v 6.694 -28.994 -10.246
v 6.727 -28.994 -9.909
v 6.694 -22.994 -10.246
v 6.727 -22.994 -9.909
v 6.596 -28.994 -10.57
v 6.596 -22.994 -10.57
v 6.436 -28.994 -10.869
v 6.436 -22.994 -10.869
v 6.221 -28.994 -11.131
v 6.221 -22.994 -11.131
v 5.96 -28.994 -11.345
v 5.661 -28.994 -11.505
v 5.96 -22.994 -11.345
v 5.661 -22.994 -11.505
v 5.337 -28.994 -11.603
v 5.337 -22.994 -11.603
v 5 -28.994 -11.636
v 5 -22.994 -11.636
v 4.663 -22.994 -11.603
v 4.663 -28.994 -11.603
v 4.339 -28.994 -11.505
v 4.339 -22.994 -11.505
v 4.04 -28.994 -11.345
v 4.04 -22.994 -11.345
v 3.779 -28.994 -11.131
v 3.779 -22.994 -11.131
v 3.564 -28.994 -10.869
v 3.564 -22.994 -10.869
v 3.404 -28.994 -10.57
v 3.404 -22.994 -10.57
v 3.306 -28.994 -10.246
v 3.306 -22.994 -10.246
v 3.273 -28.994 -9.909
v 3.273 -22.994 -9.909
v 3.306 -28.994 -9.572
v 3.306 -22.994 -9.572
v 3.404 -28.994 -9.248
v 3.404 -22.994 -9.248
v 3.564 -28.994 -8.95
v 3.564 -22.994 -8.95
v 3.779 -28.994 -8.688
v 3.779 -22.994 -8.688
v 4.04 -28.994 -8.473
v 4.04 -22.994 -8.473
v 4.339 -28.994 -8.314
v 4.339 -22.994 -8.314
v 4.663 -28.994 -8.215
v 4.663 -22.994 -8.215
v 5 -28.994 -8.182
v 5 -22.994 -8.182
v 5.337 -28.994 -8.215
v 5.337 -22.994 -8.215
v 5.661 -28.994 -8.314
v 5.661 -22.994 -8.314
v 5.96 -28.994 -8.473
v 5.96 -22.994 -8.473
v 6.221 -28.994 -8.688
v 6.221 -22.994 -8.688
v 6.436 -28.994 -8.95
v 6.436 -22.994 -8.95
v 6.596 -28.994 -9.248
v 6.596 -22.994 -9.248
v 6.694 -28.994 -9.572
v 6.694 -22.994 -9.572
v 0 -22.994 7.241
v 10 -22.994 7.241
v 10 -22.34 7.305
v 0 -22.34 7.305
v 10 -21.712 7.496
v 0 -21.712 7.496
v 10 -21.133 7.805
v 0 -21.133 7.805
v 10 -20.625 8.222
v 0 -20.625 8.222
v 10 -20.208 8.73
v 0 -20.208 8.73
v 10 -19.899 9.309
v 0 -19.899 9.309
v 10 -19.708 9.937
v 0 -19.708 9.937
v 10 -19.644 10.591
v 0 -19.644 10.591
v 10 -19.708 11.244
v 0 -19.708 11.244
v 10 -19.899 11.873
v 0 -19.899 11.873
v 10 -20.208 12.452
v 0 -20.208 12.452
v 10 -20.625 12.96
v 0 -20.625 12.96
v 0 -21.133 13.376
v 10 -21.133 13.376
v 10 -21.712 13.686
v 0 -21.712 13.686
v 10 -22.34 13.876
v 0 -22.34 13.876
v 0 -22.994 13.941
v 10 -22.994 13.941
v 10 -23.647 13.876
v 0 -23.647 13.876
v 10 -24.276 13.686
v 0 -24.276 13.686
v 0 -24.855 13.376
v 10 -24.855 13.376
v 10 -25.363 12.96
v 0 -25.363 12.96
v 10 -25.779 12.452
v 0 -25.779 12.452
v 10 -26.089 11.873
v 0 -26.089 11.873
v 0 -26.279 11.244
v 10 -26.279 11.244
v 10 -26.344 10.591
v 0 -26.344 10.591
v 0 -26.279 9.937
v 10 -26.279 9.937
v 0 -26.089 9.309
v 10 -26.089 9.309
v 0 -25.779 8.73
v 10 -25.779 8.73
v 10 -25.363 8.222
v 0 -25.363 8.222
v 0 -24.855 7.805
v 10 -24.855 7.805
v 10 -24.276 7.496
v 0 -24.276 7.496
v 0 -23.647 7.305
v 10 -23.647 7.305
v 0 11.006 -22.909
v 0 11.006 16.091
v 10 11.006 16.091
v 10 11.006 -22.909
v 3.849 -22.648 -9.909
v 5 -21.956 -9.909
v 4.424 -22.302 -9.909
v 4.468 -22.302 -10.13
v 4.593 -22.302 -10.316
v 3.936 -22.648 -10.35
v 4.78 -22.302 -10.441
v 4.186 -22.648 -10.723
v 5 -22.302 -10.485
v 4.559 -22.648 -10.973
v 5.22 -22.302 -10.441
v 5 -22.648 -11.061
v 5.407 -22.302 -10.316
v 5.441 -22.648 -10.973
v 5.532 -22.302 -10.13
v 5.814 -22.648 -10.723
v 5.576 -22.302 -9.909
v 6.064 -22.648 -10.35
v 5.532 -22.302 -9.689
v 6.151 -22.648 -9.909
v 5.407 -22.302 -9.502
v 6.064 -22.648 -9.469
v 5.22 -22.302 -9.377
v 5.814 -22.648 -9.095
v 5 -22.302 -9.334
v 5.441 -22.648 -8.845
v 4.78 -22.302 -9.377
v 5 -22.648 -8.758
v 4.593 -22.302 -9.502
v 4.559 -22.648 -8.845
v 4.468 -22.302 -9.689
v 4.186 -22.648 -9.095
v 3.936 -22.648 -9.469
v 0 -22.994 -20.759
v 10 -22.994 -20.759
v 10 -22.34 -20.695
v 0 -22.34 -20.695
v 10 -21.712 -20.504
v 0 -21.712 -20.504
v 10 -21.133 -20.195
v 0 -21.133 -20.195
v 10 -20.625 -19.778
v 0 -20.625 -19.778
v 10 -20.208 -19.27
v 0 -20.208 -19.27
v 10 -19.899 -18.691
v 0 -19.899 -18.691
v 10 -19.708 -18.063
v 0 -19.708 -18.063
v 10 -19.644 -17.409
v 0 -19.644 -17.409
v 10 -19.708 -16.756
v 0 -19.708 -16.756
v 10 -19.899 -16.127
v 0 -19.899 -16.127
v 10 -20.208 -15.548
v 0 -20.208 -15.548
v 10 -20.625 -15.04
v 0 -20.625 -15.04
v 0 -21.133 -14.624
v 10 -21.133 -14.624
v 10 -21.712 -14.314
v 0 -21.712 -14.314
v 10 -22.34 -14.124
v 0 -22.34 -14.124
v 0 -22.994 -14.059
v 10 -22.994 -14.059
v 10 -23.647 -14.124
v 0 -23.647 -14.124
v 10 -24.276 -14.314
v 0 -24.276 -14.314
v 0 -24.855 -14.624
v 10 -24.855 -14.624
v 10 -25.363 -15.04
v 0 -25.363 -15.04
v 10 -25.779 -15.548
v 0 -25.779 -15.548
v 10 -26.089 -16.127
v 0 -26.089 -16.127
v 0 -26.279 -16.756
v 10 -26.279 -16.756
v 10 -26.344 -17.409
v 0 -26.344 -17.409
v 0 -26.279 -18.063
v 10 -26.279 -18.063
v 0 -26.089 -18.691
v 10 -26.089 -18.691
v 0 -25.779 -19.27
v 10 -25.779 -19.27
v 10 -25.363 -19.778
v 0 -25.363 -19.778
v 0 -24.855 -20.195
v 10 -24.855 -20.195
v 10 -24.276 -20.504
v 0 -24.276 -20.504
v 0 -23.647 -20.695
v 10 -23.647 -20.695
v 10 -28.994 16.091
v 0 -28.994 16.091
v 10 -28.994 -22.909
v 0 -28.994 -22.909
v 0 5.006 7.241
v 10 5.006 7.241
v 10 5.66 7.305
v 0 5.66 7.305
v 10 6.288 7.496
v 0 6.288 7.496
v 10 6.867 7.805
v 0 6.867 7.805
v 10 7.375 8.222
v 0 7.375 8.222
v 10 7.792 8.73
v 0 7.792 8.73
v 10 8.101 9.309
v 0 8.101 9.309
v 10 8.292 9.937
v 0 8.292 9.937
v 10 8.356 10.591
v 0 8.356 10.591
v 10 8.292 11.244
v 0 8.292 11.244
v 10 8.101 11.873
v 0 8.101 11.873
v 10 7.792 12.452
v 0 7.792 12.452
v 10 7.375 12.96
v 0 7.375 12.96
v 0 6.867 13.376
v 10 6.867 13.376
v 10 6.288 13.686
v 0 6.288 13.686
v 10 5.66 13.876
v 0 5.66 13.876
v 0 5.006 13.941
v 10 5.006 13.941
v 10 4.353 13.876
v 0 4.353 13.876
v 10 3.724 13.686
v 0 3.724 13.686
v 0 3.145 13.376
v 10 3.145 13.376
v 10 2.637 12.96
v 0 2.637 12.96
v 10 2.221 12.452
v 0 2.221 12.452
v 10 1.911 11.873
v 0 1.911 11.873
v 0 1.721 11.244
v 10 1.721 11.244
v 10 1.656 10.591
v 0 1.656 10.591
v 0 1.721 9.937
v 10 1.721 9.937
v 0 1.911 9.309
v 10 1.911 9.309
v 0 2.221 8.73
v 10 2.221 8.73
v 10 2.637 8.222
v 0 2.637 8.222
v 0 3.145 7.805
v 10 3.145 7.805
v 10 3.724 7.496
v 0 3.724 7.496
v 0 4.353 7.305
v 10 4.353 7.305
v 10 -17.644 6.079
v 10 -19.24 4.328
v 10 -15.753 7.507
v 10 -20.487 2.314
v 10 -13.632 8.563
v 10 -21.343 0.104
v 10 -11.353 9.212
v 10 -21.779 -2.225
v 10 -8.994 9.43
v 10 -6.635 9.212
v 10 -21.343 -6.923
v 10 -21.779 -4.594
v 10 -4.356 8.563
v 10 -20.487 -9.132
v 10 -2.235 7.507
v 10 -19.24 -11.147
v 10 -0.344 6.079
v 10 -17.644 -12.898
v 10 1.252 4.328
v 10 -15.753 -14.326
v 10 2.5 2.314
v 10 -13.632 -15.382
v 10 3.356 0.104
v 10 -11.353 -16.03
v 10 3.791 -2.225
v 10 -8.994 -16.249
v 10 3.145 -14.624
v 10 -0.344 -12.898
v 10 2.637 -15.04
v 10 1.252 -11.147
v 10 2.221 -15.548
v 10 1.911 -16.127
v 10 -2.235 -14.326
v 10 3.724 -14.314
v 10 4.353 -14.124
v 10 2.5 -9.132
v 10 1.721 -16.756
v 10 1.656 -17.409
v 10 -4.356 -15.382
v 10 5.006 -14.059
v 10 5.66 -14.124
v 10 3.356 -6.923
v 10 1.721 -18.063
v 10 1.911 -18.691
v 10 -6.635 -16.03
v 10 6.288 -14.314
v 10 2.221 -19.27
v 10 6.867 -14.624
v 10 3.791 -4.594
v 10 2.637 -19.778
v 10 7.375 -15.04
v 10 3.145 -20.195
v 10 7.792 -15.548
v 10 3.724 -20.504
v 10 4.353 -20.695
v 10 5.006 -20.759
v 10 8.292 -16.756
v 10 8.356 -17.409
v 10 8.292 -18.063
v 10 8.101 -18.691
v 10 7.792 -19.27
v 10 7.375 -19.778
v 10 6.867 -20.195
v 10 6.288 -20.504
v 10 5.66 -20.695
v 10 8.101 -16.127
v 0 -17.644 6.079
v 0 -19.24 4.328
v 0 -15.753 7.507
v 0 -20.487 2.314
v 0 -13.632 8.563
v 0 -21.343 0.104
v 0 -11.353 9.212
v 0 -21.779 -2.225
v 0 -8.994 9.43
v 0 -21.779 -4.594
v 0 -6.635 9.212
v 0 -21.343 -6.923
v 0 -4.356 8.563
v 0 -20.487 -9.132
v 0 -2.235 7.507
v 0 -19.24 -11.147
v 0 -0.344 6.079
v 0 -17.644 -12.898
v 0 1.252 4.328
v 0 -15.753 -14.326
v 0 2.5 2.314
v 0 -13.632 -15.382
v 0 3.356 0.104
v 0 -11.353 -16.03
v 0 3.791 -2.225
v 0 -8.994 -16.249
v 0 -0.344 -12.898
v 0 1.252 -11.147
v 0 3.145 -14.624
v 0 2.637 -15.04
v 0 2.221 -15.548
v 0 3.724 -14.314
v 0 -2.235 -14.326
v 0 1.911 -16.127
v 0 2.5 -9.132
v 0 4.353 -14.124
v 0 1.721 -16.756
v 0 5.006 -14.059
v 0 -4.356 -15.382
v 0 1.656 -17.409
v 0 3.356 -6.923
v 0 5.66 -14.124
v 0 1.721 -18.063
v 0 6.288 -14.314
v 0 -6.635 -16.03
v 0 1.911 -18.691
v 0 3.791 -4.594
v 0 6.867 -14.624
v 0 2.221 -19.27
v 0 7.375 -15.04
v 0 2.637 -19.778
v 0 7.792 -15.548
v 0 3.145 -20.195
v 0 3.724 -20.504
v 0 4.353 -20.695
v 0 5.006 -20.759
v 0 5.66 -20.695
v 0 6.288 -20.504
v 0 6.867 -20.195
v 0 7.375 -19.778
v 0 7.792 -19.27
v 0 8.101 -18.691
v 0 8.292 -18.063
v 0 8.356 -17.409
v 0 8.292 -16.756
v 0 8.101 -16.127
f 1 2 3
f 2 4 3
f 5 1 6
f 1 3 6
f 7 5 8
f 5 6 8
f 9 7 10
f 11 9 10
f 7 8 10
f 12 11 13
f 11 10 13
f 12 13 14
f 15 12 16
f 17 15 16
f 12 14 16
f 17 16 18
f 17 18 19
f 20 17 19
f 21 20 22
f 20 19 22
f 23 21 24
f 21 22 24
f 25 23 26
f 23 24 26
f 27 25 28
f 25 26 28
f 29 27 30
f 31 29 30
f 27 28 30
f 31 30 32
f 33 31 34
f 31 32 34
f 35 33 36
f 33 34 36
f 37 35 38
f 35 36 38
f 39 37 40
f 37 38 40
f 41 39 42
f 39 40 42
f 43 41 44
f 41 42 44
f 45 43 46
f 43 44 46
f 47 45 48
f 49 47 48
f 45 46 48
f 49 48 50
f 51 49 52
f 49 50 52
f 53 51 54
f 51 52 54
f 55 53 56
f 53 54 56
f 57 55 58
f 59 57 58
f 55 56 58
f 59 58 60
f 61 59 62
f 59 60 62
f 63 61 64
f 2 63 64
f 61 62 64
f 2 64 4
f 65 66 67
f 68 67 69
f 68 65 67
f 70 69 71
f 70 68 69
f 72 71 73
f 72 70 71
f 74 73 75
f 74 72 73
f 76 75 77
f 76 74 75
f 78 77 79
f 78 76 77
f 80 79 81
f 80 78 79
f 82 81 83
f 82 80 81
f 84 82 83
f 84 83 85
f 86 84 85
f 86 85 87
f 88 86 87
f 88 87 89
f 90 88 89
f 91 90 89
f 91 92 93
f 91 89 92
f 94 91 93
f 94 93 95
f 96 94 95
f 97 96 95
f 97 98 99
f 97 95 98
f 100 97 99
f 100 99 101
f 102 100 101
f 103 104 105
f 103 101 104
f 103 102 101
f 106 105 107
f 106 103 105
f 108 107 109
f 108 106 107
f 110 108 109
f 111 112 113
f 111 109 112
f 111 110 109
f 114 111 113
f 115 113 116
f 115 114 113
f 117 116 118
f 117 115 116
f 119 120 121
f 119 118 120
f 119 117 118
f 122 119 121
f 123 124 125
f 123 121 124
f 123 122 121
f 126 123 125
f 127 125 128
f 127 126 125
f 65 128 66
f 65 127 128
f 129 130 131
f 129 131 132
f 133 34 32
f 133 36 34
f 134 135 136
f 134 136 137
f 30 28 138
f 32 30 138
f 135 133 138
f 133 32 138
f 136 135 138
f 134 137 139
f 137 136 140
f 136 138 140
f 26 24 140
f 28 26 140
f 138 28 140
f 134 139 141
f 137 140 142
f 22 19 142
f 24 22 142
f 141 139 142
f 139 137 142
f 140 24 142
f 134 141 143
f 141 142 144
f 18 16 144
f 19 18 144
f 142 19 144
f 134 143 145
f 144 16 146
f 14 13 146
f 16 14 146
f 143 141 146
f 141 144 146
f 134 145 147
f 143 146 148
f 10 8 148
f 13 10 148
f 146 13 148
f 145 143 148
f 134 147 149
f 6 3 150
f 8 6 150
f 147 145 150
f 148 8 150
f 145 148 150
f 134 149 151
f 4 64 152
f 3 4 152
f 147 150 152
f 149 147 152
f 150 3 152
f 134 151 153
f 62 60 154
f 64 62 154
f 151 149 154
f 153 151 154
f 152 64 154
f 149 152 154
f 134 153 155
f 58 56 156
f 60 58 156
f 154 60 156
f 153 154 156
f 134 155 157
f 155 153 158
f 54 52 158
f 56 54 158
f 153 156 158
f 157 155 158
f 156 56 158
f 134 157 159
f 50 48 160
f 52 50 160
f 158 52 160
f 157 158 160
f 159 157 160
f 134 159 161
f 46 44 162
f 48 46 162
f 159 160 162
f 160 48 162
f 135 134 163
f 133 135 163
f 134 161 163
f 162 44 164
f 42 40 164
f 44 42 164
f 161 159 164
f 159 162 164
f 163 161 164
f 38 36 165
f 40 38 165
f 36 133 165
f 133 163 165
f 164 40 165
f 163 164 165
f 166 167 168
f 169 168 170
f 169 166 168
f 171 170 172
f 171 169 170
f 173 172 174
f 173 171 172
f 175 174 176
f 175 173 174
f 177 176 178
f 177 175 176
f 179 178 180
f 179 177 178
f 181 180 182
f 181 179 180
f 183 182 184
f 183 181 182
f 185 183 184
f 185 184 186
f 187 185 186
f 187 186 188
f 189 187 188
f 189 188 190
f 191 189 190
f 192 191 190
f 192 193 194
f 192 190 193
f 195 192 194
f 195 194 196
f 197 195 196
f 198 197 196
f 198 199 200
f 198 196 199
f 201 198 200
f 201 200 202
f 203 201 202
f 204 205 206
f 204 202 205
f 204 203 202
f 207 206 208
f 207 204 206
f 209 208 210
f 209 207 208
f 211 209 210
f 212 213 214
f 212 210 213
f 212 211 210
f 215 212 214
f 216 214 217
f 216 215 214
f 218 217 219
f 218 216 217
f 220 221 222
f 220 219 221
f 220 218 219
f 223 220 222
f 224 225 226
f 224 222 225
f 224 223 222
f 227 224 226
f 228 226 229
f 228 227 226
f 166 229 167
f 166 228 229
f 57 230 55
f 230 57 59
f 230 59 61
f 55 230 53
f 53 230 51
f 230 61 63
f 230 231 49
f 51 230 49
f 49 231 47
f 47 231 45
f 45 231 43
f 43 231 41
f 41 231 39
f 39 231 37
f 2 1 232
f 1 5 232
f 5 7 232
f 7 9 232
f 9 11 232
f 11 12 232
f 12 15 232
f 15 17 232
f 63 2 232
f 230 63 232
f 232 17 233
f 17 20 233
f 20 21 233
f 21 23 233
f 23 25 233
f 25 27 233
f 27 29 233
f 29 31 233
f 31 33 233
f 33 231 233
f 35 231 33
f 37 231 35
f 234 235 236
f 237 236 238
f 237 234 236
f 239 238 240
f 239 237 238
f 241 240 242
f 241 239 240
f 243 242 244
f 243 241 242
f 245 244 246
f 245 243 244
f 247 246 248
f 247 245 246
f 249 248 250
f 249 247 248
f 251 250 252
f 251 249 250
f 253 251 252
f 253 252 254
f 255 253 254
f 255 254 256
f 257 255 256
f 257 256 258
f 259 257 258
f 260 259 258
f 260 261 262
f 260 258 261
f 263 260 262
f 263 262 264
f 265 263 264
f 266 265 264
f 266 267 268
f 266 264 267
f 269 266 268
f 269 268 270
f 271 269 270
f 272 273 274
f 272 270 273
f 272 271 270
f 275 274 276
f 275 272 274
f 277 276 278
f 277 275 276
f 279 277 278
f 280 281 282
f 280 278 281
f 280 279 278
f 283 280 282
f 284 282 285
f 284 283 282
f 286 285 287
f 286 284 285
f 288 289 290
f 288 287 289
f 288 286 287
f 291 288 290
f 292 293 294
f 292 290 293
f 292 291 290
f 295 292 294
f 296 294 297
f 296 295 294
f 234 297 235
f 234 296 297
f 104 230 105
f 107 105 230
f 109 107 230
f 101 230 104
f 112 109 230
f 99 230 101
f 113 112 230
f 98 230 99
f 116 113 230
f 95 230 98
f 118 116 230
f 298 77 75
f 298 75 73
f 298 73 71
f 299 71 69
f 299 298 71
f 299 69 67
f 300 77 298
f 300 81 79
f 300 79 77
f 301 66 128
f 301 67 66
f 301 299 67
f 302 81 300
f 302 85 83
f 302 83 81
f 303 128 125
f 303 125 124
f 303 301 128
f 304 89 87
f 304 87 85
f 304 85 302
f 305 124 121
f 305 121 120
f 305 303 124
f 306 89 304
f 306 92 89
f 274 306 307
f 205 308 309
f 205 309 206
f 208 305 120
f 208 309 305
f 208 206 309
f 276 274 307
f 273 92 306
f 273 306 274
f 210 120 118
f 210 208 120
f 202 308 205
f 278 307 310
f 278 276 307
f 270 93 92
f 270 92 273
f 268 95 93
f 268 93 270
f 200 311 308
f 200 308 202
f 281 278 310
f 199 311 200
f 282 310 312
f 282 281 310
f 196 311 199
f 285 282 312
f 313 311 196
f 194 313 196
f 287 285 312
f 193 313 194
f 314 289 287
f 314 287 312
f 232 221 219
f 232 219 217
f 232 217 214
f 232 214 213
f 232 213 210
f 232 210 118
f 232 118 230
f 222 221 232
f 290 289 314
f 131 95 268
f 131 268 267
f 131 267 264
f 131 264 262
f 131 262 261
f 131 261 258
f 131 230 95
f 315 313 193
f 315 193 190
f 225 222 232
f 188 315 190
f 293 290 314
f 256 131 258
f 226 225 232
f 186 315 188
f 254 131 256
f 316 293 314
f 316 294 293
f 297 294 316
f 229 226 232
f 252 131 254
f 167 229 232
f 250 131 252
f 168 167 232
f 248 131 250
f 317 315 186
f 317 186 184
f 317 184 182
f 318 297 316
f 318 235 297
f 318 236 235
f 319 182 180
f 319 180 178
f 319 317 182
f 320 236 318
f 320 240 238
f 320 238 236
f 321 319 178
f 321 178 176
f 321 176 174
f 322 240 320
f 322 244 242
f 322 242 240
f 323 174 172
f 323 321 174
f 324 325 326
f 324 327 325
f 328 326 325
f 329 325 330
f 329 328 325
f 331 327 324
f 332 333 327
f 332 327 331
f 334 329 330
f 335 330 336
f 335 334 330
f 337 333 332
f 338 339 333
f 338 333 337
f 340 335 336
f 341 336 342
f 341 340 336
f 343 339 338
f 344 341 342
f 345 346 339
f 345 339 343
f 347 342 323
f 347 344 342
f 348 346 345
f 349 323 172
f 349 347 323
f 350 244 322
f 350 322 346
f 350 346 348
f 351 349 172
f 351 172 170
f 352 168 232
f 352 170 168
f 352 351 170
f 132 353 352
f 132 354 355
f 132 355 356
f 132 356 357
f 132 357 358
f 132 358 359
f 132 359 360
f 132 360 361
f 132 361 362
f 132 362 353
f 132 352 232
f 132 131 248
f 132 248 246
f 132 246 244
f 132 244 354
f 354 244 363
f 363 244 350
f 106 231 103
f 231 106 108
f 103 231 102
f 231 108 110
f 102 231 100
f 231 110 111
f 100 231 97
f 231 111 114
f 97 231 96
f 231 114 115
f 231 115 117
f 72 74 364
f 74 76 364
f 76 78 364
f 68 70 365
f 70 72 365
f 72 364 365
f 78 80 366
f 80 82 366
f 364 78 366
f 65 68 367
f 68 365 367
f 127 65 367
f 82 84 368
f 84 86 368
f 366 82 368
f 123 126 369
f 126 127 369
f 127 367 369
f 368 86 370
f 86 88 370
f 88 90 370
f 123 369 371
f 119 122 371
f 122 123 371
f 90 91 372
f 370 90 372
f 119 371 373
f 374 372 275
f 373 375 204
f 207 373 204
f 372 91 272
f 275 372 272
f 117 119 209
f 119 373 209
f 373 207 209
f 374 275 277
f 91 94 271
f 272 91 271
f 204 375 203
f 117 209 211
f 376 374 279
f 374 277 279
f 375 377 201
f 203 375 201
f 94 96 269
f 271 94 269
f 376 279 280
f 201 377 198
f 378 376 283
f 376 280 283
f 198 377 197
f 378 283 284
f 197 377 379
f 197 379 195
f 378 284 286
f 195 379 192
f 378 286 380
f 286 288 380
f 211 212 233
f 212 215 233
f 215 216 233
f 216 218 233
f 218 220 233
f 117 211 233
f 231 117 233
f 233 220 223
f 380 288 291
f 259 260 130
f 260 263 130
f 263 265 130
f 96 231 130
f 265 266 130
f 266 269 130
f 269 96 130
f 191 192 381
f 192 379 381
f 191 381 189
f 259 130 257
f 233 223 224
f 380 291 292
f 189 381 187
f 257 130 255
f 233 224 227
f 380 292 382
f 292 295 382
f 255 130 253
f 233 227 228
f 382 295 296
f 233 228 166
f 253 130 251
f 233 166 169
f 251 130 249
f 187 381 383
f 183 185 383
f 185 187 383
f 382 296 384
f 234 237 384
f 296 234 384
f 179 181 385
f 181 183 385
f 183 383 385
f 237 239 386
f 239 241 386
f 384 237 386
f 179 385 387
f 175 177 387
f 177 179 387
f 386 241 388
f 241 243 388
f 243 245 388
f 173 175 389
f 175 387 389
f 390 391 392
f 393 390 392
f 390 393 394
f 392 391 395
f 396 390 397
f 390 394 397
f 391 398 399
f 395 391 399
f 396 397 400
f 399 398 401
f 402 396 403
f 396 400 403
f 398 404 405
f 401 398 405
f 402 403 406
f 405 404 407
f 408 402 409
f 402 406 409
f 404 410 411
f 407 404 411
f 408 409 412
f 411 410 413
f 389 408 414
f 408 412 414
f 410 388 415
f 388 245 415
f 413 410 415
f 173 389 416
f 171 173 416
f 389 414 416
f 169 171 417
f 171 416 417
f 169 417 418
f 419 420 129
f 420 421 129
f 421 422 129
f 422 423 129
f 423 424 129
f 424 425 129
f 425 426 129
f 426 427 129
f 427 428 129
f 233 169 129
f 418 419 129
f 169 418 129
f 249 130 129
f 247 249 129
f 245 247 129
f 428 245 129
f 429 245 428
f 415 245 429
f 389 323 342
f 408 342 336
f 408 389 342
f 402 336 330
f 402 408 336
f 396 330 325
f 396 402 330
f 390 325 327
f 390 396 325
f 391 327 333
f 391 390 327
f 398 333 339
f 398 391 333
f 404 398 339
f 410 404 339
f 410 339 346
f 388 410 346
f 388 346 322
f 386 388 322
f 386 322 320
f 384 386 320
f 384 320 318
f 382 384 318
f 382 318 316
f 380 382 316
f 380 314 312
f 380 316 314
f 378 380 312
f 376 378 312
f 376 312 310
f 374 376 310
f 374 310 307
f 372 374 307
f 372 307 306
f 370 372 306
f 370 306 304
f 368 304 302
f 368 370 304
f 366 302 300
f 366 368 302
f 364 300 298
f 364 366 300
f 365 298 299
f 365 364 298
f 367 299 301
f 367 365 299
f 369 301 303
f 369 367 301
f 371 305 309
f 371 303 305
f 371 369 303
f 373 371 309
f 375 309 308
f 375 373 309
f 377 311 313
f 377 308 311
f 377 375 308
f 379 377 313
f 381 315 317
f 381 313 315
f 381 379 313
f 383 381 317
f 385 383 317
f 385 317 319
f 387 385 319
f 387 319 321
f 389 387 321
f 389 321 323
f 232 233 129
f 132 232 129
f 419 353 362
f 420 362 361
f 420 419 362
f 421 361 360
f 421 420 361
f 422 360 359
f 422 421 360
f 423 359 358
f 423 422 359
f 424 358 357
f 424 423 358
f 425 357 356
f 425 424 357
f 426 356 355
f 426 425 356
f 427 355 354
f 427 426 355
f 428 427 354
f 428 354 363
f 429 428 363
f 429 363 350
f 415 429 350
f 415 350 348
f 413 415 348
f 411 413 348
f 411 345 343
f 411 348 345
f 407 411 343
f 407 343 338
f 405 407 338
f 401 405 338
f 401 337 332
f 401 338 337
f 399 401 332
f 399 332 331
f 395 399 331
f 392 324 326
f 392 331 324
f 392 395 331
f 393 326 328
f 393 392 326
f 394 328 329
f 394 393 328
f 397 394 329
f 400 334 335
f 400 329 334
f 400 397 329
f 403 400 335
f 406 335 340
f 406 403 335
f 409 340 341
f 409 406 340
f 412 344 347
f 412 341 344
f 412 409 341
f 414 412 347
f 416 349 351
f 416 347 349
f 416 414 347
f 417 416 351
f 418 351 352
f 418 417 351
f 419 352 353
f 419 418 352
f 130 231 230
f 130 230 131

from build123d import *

# Parameters (mm, degrees)
SKETCH1_W                       = 39
SKETCH1_H                       = 40
BOSS_EXTRUDE1_DEPTH             = 10
SM1_THREADED_HOLE_REACH         = 40.282
SKETCH1_3_R                     = 12.8397
OVERSIZED_8_32_THRU_HOLES_REACH = 40.282
SKETCH1_4_R                     = 3.35
F_8_32_TAPPED_HOLE1_D           = 3.4544
F_8_32_TAPPED_HOLE1_DEPTH       = 6
F_8_32_TAPPED_HOLE1_TIP         = 1.037806461


with BuildPart() as part:
    # Sketch1 → Boss-Extrude1 (new body)
    with BuildSketch(Plane(origin=(0, 0, 0), x_dir=(0, 0, -1), z_dir=(1, 0, 0))):
        with Locations((3.409258695, -8.993814604)):
            Rectangle(SKETCH1_W, SKETCH1_H)
    extrude(amount=BOSS_EXTRUDE1_DEPTH)

    # Sketch1<3> → SM1 threaded hole (cut, up to next)
    with BuildSketch(Plane(origin=(0, 0, 0), x_dir=(0, 0, -1), z_dir=(1, 0, 0)), mode=Mode.PRIVATE) as sm1_threaded_hole_sk1:
        with Locations((3.409258695, -8.993814604)):
            Circle(SKETCH1_3_R)
    sm1_threaded_hole_tool1 = extrude(sm1_threaded_hole_sk1.sketch, amount=SM1_THREADED_HOLE_REACH, mode=Mode.PRIVATE) & part.part
    add(sm1_threaded_hole_tool1.solids().sort_by_distance((0, -8.993815, -3.409259))[0], mode=Mode.SUBTRACT)

    # Sketch1<4> → oversized 8-32 thru holes (cut, up to next)
    with BuildSketch(Plane(origin=(0, 0, 0), x_dir=(0, 0, -1), z_dir=(1, 0, 0)), mode=Mode.PRIVATE) as oversized_8_32_thru_holes_sk1:
        with Locations((-10.590741305, 5.006185396)):
            Circle(SKETCH1_4_R)
    oversized_8_32_thru_holes_tool1 = extrude(oversized_8_32_thru_holes_sk1.sketch, amount=OVERSIZED_8_32_THRU_HOLES_REACH, mode=Mode.PRIVATE) & part.part
    # Sketch1<4> → oversized 8-32 thru holes (cut, up to next)
    with BuildSketch(Plane(origin=(0, 0, 0), x_dir=(0, 0, -1), z_dir=(1, 0, 0)), mode=Mode.PRIVATE) as oversized_8_32_thru_holes_sk2:
        with Locations((17.409258695, 5.006185396)):
            Circle(SKETCH1_4_R)
    oversized_8_32_thru_holes_tool2 = extrude(oversized_8_32_thru_holes_sk2.sketch, amount=OVERSIZED_8_32_THRU_HOLES_REACH, mode=Mode.PRIVATE) & part.part
    # Sketch1<4> → oversized 8-32 thru holes (cut, up to next)
    with BuildSketch(Plane(origin=(0, 0, 0), x_dir=(0, 0, -1), z_dir=(1, 0, 0)), mode=Mode.PRIVATE) as oversized_8_32_thru_holes_sk3:
        with Locations((17.409258695, -22.993814604)):
            Circle(SKETCH1_4_R)
    oversized_8_32_thru_holes_tool3 = extrude(oversized_8_32_thru_holes_sk3.sketch, amount=OVERSIZED_8_32_THRU_HOLES_REACH, mode=Mode.PRIVATE) & part.part
    # Sketch1<4> → oversized 8-32 thru holes (cut, up to next)
    with BuildSketch(Plane(origin=(0, 0, 0), x_dir=(0, 0, -1), z_dir=(1, 0, 0)), mode=Mode.PRIVATE) as oversized_8_32_thru_holes_sk4:
        with Locations((-10.590741305, -22.993814604)):
            Circle(SKETCH1_4_R)
    oversized_8_32_thru_holes_tool4 = extrude(oversized_8_32_thru_holes_sk4.sketch, amount=OVERSIZED_8_32_THRU_HOLES_REACH, mode=Mode.PRIVATE) & part.part
    add(oversized_8_32_thru_holes_tool1.solids().sort_by_distance((0, 5.006185, 10.590741))[0], mode=Mode.SUBTRACT)
    add(oversized_8_32_thru_holes_tool2.solids().sort_by_distance((0, 5.006185, -17.409259))[0], mode=Mode.SUBTRACT)
    add(oversized_8_32_thru_holes_tool3.solids().sort_by_distance((0, -22.993815, -17.409259))[0], mode=Mode.SUBTRACT)
    add(oversized_8_32_thru_holes_tool4.solids().sort_by_distance((0, -22.993815, 10.590741))[0], mode=Mode.SUBTRACT)

    # #8-32 Tapped Hole1
    with Locations(Plane(origin=(0, -28.993814604, 0), x_dir=(-1, 0, 0), z_dir=(0, -1, 0))):
        with Locations((-5, 9.909258695)):
            Hole(F_8_32_TAPPED_HOLE1_D / 2, depth=F_8_32_TAPPED_HOLE1_DEPTH)
            with Locations((0, 0, -(F_8_32_TAPPED_HOLE1_DEPTH + F_8_32_TAPPED_HOLE1_TIP / 2))):  # 118° drill point
                Cone(0, F_8_32_TAPPED_HOLE1_D / 2, F_8_32_TAPPED_HOLE1_TIP, mode=Mode.SUBTRACT)


solid = part.part
